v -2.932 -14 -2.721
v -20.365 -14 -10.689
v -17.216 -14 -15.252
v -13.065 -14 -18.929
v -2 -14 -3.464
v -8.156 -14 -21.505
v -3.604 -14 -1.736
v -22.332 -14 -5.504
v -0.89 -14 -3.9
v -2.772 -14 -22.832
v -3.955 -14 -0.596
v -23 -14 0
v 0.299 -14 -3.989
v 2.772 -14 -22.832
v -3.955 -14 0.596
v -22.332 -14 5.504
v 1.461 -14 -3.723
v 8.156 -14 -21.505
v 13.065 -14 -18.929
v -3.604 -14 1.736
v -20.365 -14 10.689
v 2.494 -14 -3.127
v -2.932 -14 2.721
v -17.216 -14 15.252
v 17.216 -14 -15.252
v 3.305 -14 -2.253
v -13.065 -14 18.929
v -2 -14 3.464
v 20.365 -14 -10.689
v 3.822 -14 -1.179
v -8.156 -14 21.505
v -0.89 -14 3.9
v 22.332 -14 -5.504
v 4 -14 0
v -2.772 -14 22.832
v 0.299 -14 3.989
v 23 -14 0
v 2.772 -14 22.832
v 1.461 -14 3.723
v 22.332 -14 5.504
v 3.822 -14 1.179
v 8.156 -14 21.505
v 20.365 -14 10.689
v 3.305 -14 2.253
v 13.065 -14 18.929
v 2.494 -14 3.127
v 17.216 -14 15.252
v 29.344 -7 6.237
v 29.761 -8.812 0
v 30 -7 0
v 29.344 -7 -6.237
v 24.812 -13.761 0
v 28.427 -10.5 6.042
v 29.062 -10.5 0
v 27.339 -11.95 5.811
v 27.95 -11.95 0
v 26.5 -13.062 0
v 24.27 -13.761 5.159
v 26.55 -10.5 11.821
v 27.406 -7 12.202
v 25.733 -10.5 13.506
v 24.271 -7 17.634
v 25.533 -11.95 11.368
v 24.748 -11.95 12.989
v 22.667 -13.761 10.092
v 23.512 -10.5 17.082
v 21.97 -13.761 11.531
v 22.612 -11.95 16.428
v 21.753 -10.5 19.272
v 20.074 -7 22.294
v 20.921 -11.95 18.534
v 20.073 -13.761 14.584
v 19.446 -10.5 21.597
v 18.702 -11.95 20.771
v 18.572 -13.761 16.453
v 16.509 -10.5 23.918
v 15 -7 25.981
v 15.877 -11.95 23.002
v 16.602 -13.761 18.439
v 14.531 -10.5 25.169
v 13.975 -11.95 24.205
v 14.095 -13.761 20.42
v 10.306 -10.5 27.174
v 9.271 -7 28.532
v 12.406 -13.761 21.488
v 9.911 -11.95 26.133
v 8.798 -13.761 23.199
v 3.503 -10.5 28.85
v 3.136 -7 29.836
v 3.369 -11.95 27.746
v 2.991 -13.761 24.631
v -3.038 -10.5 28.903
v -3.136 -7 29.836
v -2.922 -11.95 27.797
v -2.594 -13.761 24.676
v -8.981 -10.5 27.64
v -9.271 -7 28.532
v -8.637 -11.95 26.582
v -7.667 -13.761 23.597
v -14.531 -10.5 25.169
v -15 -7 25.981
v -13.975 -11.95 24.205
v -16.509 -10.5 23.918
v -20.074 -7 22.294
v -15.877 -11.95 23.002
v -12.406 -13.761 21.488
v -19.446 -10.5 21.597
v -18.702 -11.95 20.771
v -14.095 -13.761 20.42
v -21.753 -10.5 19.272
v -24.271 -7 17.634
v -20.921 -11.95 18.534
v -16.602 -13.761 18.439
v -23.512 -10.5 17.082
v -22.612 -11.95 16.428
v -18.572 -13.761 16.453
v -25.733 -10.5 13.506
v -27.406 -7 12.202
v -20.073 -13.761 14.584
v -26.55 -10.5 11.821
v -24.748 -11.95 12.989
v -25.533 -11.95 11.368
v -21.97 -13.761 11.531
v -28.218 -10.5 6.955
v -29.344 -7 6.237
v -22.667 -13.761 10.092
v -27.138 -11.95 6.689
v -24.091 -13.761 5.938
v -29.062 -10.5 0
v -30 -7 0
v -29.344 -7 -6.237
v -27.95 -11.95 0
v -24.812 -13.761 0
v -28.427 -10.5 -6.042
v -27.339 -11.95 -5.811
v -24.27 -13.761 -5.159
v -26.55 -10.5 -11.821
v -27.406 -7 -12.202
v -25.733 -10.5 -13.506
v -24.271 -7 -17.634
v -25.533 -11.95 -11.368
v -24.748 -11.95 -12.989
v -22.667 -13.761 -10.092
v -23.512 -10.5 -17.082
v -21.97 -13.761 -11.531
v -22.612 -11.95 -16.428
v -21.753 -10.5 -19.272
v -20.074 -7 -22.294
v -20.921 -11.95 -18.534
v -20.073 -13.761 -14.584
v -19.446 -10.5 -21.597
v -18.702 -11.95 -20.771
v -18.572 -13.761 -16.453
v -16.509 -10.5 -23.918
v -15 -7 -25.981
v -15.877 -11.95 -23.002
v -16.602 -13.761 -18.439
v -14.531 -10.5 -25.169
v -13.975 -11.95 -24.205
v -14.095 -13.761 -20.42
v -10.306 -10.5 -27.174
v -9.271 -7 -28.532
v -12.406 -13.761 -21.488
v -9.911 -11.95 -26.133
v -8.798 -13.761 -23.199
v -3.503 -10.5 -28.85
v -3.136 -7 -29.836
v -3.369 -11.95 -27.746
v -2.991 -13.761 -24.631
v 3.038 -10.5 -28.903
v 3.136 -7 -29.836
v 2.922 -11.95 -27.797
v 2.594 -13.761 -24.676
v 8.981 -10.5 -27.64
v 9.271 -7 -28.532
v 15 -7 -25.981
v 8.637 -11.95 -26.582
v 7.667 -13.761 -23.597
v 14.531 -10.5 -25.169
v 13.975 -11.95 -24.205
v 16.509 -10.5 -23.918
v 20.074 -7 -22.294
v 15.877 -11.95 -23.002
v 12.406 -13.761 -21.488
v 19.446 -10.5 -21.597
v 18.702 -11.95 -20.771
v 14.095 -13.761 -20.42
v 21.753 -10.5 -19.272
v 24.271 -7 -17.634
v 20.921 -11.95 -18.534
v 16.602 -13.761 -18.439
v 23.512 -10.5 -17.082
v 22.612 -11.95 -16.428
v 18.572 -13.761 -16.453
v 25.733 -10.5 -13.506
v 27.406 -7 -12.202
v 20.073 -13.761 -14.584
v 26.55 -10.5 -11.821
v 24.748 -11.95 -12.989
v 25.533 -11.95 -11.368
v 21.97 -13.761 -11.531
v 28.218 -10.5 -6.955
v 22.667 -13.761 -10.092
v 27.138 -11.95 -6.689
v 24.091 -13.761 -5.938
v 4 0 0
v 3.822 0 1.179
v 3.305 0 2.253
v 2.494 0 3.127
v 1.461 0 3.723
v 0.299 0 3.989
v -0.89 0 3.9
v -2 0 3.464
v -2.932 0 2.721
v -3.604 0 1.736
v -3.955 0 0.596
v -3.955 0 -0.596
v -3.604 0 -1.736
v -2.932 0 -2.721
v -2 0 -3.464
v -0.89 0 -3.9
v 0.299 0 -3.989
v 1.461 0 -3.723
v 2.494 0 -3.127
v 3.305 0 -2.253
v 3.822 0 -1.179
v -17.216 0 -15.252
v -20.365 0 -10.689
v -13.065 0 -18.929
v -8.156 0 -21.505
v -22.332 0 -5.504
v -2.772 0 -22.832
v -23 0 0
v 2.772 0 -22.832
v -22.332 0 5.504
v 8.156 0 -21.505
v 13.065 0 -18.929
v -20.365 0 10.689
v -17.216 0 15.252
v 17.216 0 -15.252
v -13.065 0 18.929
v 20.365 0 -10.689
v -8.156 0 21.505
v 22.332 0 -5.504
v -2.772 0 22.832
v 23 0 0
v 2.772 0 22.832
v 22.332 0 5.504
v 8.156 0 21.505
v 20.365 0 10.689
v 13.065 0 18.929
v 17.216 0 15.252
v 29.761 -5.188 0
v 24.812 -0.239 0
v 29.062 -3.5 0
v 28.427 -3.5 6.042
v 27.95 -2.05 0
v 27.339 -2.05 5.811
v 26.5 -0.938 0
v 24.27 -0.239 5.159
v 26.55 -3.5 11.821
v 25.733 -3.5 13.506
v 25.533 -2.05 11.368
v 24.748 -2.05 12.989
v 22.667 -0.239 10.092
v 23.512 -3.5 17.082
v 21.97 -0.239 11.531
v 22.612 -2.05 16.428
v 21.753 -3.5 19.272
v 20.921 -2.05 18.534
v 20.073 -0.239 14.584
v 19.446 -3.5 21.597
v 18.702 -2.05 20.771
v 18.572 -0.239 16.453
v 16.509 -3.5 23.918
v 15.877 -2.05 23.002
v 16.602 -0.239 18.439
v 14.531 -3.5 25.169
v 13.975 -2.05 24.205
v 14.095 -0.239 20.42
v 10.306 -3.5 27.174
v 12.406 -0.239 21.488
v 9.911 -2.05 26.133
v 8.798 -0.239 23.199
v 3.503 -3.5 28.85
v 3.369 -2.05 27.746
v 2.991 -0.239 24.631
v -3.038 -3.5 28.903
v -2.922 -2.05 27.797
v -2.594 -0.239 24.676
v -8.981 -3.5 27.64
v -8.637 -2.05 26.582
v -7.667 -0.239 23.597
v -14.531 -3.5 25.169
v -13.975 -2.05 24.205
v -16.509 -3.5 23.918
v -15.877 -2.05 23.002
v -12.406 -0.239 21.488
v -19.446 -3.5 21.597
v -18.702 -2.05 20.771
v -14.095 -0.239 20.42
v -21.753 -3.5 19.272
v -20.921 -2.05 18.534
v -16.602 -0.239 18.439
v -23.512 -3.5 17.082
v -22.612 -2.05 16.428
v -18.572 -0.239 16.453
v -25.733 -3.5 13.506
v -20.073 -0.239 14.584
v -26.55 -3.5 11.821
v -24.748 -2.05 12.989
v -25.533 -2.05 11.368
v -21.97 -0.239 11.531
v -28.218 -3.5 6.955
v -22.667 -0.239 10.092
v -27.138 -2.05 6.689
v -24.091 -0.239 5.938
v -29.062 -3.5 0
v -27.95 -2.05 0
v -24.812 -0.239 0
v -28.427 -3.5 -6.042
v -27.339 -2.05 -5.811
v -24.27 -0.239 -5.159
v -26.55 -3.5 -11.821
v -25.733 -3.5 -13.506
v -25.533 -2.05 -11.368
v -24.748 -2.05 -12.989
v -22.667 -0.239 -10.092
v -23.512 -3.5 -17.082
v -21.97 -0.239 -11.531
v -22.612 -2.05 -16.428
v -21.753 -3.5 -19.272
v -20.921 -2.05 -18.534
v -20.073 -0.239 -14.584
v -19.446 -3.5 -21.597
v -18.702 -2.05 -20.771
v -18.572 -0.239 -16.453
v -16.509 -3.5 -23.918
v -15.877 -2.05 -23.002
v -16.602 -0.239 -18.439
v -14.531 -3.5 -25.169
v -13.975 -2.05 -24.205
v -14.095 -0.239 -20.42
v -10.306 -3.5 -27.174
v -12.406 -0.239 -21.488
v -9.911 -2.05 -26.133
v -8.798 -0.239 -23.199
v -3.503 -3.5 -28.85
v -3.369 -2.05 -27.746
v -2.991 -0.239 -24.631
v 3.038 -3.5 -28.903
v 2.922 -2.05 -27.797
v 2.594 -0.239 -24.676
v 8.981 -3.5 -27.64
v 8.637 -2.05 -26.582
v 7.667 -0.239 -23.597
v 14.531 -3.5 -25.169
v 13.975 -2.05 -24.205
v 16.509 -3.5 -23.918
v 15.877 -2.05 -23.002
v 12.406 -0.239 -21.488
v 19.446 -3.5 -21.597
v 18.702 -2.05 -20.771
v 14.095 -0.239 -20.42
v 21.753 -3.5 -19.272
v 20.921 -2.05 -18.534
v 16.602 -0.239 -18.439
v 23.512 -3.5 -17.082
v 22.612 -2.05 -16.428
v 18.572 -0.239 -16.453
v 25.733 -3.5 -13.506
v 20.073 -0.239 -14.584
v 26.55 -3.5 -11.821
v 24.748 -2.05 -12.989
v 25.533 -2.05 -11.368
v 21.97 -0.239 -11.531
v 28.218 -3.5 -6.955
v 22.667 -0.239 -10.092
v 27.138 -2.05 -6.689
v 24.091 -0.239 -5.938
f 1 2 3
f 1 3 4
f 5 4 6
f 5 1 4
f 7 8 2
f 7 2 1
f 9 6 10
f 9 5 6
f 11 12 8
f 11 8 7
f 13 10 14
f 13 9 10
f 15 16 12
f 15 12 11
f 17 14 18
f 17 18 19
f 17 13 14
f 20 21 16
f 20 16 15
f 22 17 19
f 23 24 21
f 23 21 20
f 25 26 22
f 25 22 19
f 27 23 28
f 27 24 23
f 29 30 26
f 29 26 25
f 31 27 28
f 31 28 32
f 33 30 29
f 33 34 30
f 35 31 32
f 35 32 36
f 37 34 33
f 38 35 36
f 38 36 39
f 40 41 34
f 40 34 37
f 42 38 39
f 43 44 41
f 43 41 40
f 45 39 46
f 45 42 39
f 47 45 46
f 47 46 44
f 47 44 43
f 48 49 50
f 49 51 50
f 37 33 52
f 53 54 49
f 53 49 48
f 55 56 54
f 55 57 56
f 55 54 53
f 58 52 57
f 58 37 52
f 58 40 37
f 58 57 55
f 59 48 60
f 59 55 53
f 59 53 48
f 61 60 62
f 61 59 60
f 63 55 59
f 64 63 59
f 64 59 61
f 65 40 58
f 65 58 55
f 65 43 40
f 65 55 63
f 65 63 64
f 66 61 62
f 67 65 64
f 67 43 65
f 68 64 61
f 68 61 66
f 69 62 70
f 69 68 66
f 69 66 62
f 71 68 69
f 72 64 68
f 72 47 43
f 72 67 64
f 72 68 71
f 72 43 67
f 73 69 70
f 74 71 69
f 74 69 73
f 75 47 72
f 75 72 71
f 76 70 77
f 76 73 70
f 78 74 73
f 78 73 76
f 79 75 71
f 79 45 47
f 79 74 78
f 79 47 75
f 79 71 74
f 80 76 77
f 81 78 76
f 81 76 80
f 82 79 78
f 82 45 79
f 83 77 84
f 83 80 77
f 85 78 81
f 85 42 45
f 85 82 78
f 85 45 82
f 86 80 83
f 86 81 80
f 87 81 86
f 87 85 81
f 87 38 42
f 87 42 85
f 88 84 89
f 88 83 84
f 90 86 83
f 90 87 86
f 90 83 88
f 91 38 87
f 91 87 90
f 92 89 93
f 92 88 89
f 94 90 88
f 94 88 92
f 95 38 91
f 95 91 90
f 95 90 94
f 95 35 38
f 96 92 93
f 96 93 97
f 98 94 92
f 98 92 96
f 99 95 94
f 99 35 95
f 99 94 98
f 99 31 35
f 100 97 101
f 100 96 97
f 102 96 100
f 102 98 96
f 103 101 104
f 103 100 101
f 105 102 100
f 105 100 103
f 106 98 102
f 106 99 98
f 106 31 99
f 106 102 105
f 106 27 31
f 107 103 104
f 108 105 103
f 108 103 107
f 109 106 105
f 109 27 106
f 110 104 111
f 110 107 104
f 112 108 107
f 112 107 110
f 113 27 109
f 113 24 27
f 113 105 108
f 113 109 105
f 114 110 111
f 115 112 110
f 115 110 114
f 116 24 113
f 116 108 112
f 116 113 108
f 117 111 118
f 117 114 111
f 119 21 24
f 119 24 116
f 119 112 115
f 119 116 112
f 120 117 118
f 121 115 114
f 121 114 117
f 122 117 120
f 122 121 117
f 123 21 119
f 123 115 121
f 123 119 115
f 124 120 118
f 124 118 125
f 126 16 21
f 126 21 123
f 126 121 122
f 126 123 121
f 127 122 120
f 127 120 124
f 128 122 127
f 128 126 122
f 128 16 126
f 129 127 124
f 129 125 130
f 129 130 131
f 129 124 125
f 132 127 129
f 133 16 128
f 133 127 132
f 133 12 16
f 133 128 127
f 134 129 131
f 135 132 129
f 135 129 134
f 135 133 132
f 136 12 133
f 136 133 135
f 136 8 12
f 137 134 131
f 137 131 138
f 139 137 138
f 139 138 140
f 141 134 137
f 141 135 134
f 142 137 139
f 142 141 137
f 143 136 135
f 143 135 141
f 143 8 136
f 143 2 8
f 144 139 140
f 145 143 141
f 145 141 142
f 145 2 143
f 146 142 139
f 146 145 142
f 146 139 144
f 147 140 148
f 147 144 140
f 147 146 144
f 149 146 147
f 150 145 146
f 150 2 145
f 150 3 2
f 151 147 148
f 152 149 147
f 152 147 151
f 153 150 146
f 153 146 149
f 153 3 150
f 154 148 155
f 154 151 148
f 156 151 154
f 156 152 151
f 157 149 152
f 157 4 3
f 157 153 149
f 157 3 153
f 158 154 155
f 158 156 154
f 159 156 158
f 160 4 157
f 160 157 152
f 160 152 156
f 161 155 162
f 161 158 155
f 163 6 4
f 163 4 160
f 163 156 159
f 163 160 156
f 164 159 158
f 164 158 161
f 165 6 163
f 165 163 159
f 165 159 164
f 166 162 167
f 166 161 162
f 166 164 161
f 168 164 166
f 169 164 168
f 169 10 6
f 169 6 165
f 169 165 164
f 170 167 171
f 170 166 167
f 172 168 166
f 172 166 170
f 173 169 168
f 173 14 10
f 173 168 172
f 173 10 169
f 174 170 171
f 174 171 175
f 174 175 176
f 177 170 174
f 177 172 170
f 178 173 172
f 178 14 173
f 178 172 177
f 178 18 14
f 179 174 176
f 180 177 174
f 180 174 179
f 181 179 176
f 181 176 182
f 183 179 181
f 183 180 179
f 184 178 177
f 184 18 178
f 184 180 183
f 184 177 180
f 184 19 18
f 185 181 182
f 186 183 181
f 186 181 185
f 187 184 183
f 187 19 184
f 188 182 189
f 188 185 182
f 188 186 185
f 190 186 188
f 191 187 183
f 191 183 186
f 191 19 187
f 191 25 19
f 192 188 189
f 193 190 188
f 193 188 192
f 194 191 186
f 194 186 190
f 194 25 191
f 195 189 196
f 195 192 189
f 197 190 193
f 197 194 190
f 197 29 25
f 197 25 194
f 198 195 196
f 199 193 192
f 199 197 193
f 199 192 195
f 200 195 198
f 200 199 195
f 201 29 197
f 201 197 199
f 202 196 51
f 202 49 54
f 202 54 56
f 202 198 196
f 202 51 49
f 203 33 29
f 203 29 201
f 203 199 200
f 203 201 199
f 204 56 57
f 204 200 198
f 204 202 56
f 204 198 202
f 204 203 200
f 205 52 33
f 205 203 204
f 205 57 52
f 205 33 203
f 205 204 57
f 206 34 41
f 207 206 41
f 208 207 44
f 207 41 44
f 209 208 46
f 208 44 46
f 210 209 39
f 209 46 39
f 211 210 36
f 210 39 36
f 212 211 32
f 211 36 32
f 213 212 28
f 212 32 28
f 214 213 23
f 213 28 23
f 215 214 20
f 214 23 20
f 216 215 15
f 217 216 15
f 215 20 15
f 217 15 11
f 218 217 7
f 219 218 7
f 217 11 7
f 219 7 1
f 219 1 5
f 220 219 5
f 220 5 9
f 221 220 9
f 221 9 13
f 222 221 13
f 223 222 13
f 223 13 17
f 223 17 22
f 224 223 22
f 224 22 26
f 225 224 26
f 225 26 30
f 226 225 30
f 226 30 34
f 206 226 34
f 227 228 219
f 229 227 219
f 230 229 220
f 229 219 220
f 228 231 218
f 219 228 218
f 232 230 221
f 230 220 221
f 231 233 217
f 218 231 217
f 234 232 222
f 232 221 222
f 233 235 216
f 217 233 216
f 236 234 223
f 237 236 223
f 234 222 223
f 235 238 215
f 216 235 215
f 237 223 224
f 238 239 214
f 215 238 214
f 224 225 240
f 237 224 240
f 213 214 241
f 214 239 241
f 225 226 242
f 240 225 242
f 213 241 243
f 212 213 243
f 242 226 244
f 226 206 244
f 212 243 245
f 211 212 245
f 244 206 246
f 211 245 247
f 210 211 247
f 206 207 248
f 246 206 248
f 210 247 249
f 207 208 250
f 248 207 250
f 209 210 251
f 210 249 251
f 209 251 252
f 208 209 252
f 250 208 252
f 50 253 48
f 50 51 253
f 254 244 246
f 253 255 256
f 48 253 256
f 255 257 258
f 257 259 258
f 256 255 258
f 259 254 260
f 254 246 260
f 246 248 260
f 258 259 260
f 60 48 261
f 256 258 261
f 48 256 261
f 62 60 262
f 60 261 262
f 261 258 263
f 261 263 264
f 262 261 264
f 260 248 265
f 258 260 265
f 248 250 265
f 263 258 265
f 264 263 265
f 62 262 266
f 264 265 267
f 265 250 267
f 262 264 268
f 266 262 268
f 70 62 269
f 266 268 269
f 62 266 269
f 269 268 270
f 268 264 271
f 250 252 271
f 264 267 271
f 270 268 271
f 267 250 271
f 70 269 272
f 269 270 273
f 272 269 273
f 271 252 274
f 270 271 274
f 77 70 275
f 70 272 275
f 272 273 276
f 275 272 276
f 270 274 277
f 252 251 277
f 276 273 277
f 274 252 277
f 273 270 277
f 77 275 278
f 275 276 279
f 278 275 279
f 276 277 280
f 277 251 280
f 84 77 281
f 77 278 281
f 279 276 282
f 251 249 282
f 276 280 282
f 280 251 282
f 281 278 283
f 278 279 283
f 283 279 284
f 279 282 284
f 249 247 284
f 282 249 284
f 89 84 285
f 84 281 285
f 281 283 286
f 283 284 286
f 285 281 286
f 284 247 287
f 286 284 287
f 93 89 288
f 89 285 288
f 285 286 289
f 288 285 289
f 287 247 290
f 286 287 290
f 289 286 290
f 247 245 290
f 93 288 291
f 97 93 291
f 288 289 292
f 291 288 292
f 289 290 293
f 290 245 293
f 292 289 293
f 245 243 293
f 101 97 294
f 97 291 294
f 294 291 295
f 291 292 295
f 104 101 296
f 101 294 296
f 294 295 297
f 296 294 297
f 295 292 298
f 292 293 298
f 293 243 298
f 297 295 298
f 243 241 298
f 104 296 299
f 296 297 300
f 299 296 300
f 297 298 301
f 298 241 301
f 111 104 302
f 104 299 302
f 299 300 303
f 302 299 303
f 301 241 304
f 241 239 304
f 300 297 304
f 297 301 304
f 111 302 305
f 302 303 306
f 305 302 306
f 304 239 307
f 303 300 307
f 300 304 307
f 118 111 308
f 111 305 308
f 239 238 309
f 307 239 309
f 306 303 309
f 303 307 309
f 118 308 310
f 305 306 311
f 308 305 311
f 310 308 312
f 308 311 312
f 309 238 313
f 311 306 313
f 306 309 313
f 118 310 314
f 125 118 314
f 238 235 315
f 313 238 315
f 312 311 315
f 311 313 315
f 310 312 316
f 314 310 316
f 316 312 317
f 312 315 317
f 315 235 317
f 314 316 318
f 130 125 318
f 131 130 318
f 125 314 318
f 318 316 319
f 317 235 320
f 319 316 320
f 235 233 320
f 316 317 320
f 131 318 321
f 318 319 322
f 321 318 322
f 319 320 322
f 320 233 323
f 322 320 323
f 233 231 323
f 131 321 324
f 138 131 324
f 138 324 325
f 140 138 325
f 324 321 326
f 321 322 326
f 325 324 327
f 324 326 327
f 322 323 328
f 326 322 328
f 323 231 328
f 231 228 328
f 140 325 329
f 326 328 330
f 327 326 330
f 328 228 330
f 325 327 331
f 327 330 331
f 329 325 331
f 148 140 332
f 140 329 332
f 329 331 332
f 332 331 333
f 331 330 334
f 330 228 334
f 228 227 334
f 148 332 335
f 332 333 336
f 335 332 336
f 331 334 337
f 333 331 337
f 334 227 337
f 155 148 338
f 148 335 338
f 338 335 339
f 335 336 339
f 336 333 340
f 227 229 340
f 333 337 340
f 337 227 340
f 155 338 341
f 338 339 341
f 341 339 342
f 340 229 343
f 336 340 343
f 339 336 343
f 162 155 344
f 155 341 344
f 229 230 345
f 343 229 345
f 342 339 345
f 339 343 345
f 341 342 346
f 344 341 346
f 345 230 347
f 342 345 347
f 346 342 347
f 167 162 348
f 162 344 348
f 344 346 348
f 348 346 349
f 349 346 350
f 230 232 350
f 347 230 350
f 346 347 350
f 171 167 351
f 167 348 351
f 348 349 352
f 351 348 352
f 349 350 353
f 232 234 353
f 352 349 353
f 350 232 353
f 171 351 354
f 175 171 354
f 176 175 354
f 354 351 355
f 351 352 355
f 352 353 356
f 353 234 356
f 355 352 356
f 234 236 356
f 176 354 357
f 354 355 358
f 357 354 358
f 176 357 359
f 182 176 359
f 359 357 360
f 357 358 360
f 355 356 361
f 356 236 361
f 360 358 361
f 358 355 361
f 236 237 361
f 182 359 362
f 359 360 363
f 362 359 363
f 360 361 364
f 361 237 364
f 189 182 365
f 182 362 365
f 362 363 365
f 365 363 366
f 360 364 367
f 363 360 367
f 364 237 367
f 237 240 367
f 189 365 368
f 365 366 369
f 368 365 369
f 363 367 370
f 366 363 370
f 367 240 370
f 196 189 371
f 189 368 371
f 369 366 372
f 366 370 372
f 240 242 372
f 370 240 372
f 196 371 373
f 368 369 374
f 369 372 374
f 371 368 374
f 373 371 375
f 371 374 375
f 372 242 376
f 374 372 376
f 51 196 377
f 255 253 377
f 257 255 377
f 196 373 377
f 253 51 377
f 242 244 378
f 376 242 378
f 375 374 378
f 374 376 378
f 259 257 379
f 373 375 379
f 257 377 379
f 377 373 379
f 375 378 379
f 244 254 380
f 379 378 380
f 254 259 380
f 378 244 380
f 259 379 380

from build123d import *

# Parameters (mm, degrees)
F0_R     = 30
F1_DEPTH = 14
F2_R     = 6.99999
F4_D     = 8
F4_DEPTH = 100
F4_TIP   = 2.4034424761


# Not quite as in the source:
# - a fillet or chamfer is up to 0.001 mm smaller than in the source, because OpenCascade refuses the exact size


with BuildPart() as f1:
    # F0 (on Front) → F1 (new body)
    with BuildSketch(Plane.XZ):
        Circle(F0_R)
    extrude(amount=F1_DEPTH)

    # F2 (radius 7 in the source; OpenCascade refuses exactly that, so slightly less here)
    f2_edges = [f1.edges().sort_by_distance(p)[0] for p in [
        (-30, -14, 0),
        (-30, 0, 0),
    ]]
    fillet(f2_edges, radius=F2_R)

    # F4
    with Locations(Plane(origin=(0, 0, 0), x_dir=(-1, 0, 0), z_dir=(0, 1, 0))):
        with Locations((0, 0)):
            Hole(F4_D / 2, depth=F4_DEPTH)
            with Locations((0, 0, -(F4_DEPTH + F4_TIP / 2))):  # 118° drill point
                Cone(0, F4_D / 2, F4_TIP, mode=Mode.SUBTRACT)


solid = f1.part
